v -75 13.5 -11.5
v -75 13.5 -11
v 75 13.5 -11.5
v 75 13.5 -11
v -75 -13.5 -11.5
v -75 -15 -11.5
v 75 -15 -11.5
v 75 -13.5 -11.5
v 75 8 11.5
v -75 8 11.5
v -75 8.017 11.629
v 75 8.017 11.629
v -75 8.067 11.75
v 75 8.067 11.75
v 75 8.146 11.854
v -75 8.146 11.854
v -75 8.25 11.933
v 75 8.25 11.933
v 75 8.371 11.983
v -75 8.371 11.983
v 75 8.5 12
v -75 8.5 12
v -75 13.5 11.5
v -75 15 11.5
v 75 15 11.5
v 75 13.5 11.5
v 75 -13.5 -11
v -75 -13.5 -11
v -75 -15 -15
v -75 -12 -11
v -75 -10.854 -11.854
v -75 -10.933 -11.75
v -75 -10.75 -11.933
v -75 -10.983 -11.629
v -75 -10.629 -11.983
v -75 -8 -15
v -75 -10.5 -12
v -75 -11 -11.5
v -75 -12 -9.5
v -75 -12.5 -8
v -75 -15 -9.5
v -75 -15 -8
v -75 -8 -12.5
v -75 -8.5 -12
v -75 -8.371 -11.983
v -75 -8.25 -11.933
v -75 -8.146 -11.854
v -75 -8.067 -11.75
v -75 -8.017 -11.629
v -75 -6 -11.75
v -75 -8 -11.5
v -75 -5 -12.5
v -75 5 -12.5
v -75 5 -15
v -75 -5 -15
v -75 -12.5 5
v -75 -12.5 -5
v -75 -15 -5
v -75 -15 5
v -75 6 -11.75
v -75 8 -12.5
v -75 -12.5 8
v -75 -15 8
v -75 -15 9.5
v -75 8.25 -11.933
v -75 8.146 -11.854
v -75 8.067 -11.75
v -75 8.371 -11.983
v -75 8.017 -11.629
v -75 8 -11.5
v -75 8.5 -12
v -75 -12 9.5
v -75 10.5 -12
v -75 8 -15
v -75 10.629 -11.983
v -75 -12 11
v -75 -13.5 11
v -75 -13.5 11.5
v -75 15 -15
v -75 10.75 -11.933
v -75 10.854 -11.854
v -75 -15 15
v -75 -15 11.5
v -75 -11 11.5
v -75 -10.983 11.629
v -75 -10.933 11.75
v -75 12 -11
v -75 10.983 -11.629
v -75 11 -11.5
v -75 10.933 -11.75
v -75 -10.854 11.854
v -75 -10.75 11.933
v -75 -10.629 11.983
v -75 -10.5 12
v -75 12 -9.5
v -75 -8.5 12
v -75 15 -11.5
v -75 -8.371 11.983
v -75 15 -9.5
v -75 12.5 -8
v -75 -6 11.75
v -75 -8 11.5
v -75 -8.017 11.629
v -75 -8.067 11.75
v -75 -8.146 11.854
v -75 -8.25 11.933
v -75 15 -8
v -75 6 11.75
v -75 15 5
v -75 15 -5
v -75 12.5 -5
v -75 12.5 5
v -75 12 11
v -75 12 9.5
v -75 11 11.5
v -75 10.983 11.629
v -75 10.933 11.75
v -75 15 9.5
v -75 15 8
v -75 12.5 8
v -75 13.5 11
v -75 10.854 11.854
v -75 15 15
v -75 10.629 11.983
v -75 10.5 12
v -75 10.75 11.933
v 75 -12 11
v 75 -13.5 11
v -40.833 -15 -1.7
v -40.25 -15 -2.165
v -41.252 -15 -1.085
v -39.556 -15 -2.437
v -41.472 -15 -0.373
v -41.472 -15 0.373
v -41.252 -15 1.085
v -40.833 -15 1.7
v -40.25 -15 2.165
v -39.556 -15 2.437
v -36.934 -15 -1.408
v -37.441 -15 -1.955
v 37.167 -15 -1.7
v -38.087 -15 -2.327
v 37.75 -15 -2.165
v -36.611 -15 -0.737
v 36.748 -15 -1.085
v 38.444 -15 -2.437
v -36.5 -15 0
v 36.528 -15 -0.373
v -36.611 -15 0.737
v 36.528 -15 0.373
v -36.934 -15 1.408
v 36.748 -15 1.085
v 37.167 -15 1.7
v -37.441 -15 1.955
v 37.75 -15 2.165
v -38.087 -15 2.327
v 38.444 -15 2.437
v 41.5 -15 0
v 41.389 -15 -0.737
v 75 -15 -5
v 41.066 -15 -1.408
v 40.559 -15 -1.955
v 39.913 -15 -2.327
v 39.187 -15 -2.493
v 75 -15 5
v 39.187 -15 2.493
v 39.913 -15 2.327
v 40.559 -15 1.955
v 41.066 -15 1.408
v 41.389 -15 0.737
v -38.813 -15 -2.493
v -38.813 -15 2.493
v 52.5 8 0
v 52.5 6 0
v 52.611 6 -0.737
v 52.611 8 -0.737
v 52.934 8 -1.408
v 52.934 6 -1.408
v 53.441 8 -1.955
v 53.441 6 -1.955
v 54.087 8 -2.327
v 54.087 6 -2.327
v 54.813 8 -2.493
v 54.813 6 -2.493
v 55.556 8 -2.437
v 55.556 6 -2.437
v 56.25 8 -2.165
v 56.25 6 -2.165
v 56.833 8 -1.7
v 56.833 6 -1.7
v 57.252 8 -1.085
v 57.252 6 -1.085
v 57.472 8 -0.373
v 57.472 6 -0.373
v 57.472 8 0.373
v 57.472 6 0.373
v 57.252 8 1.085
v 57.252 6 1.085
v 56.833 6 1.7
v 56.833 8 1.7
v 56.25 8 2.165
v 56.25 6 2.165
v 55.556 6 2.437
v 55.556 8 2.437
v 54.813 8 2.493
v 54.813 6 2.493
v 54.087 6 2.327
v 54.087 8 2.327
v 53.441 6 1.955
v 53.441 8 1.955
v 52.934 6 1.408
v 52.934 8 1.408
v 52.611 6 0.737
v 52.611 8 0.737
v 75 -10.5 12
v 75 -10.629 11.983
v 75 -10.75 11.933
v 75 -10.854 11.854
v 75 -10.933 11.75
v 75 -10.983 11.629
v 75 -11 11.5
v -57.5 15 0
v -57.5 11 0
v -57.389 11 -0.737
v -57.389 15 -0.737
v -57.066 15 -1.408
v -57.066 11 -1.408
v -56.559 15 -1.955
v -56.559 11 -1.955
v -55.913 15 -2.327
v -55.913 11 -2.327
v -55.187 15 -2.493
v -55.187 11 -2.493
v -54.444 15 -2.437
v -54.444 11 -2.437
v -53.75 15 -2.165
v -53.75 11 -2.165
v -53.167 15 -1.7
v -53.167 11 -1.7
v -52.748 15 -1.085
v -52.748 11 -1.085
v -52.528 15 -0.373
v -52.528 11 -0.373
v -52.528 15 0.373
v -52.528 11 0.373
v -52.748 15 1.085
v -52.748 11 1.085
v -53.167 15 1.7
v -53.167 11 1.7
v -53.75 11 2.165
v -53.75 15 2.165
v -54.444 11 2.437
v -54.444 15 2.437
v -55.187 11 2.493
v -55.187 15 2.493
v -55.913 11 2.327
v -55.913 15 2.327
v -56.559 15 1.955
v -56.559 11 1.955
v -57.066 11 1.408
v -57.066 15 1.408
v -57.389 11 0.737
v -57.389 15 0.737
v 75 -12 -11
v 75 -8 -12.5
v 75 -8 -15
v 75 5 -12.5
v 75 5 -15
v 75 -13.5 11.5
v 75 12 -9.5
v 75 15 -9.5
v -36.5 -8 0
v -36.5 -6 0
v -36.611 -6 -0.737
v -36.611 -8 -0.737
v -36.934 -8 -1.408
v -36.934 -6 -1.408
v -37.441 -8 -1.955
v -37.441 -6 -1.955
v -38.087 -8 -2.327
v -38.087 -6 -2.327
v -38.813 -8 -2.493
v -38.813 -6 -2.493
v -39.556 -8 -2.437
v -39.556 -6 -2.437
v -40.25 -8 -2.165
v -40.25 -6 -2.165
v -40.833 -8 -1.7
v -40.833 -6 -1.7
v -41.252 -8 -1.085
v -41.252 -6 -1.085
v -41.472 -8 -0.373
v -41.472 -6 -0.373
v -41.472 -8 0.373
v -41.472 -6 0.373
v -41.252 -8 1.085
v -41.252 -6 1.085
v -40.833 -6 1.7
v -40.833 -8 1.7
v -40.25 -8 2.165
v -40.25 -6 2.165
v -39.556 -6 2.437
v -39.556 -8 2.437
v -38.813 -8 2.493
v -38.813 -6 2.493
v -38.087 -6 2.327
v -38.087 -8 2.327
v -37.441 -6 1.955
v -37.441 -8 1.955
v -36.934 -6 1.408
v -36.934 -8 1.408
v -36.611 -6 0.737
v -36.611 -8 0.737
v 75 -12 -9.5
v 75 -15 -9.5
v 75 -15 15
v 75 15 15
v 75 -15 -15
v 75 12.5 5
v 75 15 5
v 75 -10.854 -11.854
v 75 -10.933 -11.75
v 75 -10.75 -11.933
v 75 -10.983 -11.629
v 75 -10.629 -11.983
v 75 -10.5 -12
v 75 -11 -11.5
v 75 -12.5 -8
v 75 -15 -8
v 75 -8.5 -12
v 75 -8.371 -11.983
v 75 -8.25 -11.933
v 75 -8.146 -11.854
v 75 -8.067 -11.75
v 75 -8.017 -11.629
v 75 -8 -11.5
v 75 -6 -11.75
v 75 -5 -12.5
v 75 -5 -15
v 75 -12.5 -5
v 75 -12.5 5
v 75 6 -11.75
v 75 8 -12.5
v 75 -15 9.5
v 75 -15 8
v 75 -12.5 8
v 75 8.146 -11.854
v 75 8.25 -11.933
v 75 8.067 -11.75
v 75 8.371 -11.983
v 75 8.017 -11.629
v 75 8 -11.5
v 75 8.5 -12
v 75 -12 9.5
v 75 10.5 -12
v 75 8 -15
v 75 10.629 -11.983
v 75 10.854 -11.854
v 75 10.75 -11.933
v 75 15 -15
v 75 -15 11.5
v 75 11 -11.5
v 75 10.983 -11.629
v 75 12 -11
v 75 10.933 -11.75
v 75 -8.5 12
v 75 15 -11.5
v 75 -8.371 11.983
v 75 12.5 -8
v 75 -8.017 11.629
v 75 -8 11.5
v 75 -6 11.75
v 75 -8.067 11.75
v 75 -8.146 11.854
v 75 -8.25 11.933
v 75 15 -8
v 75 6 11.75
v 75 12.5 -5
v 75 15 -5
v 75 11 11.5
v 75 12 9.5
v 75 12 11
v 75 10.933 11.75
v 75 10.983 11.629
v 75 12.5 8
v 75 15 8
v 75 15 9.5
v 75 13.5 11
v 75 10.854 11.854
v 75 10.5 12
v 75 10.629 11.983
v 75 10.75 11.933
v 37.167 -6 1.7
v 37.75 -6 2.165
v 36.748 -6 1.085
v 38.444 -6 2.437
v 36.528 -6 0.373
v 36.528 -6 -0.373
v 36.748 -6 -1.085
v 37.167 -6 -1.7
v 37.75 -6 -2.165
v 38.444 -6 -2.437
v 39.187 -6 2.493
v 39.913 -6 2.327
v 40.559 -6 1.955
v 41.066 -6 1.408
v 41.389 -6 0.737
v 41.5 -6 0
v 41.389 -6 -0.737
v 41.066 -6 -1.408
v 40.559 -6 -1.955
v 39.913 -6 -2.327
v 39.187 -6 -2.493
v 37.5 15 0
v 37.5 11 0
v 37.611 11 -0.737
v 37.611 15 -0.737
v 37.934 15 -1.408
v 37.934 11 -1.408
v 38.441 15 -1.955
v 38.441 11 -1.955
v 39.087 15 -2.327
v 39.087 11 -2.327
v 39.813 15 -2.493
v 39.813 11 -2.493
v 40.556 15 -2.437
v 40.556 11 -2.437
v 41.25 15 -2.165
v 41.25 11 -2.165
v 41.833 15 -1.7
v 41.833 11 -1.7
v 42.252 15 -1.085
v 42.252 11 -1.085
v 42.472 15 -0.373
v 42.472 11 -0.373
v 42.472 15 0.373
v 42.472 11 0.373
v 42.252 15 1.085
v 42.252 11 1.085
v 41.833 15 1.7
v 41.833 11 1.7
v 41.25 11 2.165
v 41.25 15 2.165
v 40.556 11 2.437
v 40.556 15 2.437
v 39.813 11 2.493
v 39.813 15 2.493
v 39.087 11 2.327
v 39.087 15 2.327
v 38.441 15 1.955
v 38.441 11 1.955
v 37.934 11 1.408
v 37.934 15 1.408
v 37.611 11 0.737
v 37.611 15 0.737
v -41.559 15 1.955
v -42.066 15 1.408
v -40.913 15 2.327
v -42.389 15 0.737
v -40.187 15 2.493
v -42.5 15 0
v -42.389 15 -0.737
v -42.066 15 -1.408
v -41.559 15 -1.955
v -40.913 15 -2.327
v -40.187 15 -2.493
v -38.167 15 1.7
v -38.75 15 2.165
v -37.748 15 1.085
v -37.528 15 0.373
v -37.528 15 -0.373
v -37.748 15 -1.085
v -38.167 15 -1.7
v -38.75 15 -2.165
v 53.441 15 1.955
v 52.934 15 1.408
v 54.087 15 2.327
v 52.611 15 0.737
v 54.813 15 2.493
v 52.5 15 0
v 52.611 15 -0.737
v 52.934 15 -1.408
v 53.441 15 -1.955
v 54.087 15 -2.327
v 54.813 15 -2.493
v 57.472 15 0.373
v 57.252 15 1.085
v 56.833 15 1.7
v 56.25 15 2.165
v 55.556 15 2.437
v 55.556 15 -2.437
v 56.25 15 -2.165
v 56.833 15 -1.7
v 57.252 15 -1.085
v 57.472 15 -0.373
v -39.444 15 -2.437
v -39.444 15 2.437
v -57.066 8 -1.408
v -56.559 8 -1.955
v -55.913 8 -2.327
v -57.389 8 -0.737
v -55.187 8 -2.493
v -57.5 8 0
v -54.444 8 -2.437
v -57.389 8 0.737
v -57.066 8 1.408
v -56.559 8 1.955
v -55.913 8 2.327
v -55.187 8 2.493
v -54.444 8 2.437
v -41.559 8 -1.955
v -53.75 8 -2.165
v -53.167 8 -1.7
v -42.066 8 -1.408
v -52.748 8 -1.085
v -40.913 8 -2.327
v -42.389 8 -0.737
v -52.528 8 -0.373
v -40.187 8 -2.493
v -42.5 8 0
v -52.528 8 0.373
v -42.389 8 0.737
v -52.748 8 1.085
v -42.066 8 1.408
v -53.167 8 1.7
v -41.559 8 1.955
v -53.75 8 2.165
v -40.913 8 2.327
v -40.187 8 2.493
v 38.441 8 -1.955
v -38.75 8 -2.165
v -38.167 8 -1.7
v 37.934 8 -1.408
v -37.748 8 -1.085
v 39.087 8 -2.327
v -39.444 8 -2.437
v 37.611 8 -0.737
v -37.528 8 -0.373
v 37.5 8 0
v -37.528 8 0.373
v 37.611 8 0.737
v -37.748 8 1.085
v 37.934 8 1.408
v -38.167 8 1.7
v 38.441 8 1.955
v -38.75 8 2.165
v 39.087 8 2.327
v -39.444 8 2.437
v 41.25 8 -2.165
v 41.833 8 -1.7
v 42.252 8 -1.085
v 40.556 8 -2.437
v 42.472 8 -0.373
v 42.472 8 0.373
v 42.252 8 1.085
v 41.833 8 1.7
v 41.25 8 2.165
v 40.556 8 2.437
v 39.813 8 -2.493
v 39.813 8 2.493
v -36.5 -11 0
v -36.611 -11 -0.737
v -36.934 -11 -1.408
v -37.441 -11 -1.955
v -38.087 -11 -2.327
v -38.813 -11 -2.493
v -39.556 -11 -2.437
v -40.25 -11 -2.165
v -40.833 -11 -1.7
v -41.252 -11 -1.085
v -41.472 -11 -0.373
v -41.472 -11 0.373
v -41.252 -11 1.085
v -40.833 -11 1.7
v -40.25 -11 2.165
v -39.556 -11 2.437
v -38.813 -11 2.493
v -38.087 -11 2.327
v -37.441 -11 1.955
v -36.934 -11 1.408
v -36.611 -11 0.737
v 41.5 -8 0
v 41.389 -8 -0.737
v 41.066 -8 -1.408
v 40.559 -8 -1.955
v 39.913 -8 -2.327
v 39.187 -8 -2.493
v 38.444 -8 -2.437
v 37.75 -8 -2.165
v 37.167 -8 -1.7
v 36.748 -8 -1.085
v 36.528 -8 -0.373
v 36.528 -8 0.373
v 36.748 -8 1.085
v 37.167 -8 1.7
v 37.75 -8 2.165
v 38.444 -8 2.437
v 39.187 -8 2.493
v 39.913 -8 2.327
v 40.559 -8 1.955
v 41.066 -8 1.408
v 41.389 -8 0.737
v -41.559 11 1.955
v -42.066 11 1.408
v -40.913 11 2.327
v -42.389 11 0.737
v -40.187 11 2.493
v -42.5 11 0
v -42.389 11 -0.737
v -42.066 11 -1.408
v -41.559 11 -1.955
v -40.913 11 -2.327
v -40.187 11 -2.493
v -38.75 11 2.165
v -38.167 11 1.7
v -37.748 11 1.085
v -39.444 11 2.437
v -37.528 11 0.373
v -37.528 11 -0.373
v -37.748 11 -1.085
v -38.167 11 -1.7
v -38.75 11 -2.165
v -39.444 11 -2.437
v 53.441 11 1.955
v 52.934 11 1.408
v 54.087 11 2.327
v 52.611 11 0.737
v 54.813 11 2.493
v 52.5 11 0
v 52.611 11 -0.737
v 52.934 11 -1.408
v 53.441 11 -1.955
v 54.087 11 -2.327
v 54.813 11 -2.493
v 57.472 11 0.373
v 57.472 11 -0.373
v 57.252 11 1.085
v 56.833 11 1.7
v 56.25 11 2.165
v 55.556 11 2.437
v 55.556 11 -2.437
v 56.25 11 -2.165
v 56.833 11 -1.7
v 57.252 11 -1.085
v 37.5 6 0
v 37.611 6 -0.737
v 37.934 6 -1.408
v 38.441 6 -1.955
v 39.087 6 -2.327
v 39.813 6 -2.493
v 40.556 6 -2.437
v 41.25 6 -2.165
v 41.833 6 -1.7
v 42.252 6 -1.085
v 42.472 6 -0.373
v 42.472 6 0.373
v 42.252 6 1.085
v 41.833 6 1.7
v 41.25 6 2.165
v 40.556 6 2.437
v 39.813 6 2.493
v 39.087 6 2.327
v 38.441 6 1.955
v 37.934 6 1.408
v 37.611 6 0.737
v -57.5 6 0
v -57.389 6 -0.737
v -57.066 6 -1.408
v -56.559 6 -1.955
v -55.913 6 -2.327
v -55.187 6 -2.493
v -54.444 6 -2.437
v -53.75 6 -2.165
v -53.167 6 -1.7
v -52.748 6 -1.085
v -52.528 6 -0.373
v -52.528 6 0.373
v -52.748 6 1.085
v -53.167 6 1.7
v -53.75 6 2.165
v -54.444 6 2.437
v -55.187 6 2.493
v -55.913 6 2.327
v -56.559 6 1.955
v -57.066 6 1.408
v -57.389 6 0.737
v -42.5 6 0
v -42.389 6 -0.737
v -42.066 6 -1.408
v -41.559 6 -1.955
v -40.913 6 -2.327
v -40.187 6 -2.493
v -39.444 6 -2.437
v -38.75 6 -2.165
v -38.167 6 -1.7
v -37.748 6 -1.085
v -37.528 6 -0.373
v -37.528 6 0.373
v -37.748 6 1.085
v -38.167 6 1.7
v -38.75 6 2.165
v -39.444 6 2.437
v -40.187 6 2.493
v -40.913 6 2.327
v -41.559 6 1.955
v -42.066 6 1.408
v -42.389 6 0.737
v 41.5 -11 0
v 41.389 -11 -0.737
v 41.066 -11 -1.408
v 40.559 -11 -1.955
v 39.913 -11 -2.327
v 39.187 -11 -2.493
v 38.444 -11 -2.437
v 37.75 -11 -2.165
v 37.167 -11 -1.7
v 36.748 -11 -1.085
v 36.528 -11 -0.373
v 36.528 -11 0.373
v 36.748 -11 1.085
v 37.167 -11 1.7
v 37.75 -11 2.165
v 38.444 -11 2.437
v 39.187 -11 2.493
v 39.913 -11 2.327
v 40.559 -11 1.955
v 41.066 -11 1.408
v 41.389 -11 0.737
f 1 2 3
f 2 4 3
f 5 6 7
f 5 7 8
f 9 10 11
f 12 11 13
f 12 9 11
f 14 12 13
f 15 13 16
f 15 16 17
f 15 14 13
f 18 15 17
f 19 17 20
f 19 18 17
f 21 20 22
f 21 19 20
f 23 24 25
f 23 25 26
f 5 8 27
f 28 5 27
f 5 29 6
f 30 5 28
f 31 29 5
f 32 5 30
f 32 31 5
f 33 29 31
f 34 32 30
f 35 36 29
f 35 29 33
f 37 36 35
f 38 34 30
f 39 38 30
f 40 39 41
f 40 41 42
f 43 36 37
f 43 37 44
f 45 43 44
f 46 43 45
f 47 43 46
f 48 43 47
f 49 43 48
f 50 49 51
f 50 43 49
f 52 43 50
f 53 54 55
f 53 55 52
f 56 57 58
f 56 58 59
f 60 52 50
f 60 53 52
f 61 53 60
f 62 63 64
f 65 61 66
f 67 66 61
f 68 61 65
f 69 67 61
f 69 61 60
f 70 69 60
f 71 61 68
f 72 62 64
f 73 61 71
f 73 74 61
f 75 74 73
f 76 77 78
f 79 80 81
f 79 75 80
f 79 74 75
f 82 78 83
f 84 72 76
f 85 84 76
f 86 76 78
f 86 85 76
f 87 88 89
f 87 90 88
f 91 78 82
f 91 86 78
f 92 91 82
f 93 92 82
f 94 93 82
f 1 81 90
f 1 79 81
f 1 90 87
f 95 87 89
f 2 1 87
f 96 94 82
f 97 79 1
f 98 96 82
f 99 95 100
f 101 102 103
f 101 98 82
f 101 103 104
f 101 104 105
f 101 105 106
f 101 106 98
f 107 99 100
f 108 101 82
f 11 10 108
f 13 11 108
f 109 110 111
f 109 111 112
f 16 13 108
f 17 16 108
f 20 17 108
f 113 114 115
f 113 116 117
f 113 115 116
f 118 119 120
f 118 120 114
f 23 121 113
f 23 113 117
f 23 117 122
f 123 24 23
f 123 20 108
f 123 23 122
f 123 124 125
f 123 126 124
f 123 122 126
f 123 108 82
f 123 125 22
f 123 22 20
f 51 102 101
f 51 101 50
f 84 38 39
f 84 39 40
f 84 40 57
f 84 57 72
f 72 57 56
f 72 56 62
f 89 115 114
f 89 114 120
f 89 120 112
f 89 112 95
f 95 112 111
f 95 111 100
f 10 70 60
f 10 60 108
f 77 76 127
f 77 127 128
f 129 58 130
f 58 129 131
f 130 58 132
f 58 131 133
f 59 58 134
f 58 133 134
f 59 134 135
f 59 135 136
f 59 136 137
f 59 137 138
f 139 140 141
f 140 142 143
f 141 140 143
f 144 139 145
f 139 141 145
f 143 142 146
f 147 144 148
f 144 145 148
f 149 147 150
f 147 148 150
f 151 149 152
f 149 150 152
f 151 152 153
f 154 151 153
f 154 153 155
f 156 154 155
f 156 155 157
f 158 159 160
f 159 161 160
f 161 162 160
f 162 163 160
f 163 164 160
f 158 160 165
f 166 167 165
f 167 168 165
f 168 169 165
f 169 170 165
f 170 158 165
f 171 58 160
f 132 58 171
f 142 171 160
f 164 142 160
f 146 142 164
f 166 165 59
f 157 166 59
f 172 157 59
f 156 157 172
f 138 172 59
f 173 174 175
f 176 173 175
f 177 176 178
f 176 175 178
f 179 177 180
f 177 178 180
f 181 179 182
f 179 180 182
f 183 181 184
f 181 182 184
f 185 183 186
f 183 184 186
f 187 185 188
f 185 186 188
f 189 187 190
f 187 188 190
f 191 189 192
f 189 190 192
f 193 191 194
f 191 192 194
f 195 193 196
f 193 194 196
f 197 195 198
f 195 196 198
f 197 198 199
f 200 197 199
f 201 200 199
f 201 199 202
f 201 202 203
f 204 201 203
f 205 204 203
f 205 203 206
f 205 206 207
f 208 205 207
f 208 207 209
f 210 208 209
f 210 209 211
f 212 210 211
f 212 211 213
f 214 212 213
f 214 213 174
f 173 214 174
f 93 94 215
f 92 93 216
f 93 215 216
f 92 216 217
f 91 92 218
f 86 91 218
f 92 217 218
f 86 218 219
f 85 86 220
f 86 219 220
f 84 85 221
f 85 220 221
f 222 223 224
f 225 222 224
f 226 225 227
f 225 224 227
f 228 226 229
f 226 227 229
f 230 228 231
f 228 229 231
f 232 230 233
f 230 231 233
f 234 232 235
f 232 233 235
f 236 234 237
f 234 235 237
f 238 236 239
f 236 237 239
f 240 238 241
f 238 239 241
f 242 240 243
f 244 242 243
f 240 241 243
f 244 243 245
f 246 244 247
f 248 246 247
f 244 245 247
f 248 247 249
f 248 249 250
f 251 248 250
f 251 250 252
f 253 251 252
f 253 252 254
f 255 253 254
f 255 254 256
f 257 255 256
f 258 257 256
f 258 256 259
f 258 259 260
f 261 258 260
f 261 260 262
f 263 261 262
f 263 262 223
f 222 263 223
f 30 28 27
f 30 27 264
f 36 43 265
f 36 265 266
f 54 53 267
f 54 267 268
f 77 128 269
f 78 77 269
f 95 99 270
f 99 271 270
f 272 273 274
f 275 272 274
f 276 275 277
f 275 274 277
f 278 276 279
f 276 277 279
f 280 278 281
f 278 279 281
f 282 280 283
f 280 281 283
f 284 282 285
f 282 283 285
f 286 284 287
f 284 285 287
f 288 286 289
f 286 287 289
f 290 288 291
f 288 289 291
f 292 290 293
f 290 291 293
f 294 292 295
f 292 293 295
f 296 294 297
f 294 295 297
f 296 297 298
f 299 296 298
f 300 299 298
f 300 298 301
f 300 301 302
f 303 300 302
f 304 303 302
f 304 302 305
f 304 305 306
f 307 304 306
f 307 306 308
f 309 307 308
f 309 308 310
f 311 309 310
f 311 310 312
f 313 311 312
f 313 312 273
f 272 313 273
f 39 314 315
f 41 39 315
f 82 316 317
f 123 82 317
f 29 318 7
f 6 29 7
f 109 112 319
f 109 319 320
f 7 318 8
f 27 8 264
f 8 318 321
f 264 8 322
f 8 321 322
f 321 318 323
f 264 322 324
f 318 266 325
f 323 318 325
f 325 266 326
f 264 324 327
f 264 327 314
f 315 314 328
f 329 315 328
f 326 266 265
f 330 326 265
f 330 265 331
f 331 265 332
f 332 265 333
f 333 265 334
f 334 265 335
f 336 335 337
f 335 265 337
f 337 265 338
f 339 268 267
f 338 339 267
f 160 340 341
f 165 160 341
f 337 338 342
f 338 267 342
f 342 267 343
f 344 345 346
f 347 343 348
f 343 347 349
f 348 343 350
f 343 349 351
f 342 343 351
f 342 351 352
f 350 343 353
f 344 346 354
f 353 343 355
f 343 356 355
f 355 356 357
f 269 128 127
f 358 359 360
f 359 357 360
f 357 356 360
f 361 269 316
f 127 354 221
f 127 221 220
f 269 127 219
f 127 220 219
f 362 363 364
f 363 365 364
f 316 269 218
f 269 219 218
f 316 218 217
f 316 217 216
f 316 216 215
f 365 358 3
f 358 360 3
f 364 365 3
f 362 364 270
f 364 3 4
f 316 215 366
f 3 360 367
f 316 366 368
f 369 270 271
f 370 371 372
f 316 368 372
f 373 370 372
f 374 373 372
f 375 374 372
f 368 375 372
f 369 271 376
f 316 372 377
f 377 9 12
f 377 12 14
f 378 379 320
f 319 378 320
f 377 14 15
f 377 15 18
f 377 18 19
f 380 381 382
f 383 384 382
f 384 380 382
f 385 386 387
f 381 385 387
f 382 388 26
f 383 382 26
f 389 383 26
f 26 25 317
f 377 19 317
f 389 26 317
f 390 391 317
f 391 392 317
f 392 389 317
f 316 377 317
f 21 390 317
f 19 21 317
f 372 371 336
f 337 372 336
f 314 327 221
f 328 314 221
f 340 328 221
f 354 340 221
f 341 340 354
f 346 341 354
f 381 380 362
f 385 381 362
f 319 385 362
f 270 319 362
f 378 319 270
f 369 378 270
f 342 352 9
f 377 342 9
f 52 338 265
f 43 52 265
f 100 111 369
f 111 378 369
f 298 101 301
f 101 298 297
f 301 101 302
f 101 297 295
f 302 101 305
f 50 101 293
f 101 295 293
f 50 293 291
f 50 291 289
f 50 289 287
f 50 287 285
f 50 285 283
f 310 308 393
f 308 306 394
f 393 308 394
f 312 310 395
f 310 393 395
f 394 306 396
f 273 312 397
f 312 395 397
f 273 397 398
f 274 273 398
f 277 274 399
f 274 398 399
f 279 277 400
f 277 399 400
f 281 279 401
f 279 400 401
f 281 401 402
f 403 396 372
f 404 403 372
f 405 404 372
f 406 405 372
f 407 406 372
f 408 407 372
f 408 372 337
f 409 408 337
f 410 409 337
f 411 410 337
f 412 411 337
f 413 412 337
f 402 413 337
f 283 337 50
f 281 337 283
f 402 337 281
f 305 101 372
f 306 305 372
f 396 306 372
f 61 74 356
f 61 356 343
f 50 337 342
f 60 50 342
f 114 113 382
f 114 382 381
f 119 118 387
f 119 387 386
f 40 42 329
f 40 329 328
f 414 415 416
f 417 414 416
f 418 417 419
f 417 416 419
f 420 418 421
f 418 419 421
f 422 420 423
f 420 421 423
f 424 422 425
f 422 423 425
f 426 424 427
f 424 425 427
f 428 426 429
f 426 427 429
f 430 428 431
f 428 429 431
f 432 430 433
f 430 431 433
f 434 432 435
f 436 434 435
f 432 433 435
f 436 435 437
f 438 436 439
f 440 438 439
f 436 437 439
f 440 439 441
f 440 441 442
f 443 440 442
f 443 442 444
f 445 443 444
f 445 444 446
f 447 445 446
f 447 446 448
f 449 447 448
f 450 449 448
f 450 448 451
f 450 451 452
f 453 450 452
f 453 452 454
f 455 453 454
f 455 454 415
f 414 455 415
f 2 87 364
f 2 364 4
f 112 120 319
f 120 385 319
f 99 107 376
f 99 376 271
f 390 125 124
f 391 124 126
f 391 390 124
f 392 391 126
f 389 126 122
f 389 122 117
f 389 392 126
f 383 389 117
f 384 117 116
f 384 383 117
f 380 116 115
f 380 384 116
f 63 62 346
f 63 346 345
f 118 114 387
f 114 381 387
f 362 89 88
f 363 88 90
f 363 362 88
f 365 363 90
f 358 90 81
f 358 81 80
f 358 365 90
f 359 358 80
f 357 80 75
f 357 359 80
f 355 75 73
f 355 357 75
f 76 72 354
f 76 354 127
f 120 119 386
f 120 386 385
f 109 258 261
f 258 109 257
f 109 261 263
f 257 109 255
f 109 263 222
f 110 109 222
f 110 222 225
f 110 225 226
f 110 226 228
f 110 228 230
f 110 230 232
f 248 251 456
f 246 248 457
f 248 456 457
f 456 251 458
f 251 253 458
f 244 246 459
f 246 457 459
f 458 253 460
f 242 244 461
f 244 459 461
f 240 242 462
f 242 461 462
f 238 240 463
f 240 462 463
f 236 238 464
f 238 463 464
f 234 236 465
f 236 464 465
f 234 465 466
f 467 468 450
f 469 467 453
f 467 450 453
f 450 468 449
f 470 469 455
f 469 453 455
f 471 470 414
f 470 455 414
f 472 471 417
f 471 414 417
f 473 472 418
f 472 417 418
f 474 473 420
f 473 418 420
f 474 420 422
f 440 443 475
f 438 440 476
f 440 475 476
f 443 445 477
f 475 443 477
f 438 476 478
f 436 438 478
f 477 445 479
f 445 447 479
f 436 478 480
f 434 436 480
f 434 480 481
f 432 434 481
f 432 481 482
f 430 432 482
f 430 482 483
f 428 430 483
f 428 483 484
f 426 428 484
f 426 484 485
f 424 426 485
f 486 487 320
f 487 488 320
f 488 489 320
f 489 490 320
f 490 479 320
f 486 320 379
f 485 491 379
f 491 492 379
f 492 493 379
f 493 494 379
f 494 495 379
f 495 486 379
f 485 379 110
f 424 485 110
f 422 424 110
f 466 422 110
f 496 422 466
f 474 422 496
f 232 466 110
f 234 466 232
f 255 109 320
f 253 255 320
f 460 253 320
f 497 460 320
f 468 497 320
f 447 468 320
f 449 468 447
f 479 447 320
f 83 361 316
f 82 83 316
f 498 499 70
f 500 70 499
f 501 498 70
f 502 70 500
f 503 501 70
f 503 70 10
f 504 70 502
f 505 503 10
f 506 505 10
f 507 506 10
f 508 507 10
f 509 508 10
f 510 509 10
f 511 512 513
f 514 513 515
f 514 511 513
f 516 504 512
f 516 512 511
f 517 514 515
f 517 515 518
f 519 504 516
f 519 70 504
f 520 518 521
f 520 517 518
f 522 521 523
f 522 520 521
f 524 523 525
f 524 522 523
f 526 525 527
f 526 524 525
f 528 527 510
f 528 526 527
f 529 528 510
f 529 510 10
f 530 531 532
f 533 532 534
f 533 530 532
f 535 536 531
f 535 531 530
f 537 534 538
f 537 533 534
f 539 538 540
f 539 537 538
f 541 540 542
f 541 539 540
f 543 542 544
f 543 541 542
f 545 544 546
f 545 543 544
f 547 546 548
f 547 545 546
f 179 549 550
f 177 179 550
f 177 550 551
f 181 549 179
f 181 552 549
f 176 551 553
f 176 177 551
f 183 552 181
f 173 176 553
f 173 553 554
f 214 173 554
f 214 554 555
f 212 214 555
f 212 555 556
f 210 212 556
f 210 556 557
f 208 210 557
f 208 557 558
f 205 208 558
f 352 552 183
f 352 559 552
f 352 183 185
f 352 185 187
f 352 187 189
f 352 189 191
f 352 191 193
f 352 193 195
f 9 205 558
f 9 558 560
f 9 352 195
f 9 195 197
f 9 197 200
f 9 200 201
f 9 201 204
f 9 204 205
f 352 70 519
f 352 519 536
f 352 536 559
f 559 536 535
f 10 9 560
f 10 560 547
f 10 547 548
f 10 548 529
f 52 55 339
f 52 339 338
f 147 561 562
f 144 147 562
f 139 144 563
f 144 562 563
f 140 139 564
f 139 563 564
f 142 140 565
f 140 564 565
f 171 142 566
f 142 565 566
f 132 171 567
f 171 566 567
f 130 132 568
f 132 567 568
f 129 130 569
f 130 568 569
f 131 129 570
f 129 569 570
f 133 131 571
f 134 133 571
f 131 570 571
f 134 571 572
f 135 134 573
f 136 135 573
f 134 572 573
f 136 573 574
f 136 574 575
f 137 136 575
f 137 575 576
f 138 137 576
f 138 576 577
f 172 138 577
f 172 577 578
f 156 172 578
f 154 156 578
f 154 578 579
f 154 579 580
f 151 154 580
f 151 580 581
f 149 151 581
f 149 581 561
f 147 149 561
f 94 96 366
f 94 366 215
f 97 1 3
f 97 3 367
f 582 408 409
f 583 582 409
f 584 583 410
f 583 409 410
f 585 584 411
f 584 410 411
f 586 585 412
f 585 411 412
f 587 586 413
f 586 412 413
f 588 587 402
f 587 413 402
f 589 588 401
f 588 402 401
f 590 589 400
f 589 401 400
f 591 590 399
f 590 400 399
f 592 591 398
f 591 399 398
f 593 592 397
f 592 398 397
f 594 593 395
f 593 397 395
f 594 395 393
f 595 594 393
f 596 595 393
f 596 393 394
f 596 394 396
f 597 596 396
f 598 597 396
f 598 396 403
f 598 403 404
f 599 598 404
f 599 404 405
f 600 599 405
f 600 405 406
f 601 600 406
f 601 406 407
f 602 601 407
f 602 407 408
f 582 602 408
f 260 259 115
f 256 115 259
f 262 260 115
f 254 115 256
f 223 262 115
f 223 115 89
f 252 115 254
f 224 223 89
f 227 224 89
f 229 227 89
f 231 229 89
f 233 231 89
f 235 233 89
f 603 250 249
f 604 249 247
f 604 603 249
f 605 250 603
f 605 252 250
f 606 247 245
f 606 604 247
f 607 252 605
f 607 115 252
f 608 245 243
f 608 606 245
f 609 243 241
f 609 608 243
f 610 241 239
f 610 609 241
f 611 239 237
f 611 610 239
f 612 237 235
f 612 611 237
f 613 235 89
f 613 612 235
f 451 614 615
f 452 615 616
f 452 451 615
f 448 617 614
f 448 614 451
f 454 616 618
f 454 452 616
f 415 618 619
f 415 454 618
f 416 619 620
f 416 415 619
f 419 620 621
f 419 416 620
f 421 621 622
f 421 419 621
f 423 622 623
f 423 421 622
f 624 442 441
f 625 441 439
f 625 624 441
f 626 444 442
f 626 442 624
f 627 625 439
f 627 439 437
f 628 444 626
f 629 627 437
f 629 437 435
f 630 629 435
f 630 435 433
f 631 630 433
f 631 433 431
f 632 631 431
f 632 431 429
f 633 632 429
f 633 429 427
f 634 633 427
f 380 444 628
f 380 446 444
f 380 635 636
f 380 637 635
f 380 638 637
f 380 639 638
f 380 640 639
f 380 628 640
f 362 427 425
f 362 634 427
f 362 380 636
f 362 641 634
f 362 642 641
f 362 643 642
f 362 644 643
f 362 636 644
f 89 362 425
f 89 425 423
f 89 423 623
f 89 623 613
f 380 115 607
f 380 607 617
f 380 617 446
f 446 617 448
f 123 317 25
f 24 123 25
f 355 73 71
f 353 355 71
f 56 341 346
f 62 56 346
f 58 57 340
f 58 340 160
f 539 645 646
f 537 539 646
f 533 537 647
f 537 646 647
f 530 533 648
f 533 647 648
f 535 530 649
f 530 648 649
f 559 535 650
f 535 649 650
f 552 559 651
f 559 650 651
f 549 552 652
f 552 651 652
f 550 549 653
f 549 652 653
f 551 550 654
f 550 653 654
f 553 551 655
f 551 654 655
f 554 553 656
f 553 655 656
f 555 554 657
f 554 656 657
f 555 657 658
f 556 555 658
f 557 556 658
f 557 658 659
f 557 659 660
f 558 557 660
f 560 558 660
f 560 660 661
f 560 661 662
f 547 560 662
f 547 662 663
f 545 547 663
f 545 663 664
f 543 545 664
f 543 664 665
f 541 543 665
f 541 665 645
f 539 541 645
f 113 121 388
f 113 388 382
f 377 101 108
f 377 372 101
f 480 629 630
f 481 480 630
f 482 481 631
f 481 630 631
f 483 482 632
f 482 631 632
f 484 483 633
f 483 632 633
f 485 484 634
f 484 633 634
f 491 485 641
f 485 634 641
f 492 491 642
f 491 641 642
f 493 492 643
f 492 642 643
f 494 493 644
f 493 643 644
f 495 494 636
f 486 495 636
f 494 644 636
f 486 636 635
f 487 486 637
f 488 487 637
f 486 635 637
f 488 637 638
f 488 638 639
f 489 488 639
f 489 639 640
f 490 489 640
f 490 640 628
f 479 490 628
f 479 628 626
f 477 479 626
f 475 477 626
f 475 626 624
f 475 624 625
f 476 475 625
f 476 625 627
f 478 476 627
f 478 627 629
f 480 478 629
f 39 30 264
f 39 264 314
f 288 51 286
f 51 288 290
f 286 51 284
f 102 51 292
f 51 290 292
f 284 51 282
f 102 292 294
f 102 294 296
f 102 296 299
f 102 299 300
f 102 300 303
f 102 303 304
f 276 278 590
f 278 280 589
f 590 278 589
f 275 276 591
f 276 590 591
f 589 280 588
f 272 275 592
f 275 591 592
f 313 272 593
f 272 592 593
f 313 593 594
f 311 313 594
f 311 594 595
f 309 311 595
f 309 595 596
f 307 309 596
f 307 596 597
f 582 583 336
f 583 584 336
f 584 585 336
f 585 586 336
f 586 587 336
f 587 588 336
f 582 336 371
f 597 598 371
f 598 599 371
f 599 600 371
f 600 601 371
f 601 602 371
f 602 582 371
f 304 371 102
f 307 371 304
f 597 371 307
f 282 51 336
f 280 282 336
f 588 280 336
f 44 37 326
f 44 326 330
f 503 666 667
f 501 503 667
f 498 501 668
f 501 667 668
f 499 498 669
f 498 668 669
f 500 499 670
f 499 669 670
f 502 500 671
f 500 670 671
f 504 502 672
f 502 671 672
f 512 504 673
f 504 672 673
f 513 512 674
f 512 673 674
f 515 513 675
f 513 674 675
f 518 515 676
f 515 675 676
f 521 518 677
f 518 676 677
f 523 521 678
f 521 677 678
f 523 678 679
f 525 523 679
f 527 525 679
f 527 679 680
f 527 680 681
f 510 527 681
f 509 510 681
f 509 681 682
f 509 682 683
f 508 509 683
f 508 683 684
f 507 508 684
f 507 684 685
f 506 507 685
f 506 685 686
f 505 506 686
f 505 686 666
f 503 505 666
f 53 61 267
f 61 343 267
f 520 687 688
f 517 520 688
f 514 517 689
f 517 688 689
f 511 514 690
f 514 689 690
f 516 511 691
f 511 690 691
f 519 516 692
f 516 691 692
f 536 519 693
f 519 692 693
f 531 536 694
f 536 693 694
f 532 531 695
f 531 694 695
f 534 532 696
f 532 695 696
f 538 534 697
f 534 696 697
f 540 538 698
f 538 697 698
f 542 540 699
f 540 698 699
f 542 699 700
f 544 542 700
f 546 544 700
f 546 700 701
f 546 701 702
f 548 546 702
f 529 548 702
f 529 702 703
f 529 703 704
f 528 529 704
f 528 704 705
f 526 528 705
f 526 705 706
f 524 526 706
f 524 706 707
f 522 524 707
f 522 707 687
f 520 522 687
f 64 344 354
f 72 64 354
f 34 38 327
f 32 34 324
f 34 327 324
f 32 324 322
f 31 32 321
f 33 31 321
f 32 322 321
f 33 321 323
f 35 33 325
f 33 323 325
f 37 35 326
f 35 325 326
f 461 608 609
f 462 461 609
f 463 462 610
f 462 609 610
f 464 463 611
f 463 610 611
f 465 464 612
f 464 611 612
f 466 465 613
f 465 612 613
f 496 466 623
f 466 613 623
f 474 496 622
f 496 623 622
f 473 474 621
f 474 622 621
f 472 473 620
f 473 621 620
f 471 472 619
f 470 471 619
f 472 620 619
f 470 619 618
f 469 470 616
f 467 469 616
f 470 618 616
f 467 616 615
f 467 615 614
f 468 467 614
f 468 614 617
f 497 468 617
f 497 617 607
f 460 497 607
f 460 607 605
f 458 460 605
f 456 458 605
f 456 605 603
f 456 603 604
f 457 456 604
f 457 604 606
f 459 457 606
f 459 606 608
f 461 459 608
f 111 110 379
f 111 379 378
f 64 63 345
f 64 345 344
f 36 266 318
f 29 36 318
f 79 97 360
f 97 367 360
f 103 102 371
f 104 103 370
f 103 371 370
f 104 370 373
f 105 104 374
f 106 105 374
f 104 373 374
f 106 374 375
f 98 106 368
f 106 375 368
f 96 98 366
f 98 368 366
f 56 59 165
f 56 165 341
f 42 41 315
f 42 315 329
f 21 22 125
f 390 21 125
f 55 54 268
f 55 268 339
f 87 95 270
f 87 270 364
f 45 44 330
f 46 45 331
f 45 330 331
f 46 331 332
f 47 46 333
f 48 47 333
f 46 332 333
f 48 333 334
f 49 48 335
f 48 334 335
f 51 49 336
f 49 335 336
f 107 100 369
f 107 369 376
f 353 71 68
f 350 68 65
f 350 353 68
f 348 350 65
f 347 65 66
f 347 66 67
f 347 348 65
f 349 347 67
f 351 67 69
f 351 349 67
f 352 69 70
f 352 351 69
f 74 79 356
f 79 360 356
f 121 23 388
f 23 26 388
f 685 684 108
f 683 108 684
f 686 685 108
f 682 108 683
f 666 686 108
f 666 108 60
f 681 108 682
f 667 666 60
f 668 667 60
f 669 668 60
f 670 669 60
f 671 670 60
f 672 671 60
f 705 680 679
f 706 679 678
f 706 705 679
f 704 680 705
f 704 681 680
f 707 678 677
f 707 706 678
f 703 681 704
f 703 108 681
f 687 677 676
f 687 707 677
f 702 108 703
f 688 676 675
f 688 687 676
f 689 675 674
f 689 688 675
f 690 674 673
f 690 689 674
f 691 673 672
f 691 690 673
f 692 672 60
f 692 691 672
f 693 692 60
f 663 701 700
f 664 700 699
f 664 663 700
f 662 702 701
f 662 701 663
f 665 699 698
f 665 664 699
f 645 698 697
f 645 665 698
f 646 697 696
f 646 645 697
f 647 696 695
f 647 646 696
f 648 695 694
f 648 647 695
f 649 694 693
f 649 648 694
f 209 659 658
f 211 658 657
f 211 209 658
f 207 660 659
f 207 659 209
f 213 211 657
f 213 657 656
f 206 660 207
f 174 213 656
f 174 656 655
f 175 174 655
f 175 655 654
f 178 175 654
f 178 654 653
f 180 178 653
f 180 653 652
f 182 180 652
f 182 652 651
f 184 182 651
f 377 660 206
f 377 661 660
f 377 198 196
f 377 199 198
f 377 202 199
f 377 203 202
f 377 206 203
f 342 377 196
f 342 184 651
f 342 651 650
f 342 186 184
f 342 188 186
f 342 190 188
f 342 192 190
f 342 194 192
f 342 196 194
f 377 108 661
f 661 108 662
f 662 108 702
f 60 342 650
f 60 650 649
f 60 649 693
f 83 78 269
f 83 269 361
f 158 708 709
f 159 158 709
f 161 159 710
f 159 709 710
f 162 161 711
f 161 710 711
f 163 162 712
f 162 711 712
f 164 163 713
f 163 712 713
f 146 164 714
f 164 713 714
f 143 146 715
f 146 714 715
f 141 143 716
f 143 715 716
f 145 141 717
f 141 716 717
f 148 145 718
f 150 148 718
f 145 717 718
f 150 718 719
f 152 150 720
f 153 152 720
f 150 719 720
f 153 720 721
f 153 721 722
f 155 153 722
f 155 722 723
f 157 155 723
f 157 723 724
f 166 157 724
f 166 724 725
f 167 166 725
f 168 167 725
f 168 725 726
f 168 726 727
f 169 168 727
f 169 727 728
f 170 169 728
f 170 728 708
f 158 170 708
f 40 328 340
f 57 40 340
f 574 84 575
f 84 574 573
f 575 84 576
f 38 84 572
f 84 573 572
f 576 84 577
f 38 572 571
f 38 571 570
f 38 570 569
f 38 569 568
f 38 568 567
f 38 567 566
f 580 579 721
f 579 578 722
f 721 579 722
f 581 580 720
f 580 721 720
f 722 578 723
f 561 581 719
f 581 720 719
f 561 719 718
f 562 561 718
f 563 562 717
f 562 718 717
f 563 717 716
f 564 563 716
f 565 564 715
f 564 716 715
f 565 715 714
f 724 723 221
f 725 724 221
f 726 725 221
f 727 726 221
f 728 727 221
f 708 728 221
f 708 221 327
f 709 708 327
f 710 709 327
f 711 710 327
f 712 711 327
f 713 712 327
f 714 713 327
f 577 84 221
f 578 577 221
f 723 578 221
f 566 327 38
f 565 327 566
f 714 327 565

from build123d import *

# Parameters (mm, degrees)
SKETCH_1_W             = 23.5
SKETCH_1_H             = 12
EXTRUDE_1_DEPTH        = 75
HOLE_WIZARD_M6_1_D     = 5
HOLE_WIZARD_M6_1_DEPTH = 19
HOLE_WIZARD_M6_1_TIP   = 1.502151548
HOLE_WIZARD_M6_2_D     = 5
HOLE_WIZARD_M6_2_DEPTH = 19
HOLE_WIZARD_M6_2_TIP   = 1.502151548


with BuildPart() as part:
    # 草图1 → 凸台-拉伸1 (new, symmetric)
    with BuildSketch(Plane(origin=(0, 0, 0), x_dir=(0, 0, -1), z_dir=(1, 0, 0))):
        Polygon((-15, 15), (-11.5, 15), (-11.5, 13.5), (-11, 13.5), (-11, 12), (-9.5, 12), (-9.5, 15), (-8, 15), (-8, 12.5), (-5, 12.5), (-5, 15), (5, 15), (5, 12.5), (8, 12.5), (8, 15), (9.5, 15), (9.5, 12), (11, 12), (11, 13.5), (11.5, 13.5), (11.5, 15), (15, 15), (15, 8), (12.5, 8), (12.5, 5), (15, 5), (15, -5), (12.5, -5), (12.5, -8), (15, -8), (15, -15), (11.5, -15), (11.5, -13.5), (11, -13.5), (11, -12), (9.5, -12), (9.5, -15), (8, -15), (8, -12.5), (5, -12.5), (5, -15), (-5, -15), (-5, -12.5), (-8, -12.5), (-8, -15), (-9.5, -15), (-9.5, -12), (-11, -12), (-11, -13.5), (-11.5, -13.5), (-11.5, -15), (-15, -15), align=None)
        with BuildLine():
            Line((12, -10.5), (12, -8.5))
            ThreePointArc((12, -8.5), (11.853553391, -8.146446609), (11.5, -8))
            Line((11.5, -8), (-11.5, -8))
            ThreePointArc((-11.5, -8), (-11.853553391, -8.146446609), (-12, -8.5))
            Line((-12, -8.5), (-12, -10.5))
            ThreePointArc((-12, -10.5), (-11.853553391, -10.853553391), (-11.5, -11))
            Line((-11.5, -11), (11.5, -11))
            ThreePointArc((11.5, -11), (11.853553391, -10.853553391), (12, -10.5))
        make_face(mode=Mode.SUBTRACT)
        with BuildLine():
            Line((-11.5, 11), (11.5, 11))
            ThreePointArc((11.5, 11), (11.853553391, 10.853553391), (12, 10.5))
            Line((12, 10.5), (12, 8.5))
            ThreePointArc((12, 8.5), (11.853553391, 8.146446609), (11.5, 8))
            Line((11.5, 8), (-11.5, 8))
            ThreePointArc((-11.5, 8), (-11.853553391, 8.146446609), (-12, 8.5))
            Line((-12, 8.5), (-12, 10.5))
            ThreePointArc((-12, 10.5), (-11.853553391, 10.853553391), (-11.5, 11))
        make_face(mode=Mode.SUBTRACT)
        Rectangle(SKETCH_1_W, SKETCH_1_H, mode=Mode.SUBTRACT)
    extrude(amount=EXTRUDE_1_DEPTH, both=True)

    # M6 螺纹孔1
    with Locations(Plane(origin=(0, 15, 0), x_dir=(1, 0, 0), z_dir=(0, 1, 0))):
        with Locations((-40, 0), (-55, 0), (55, 0), (40, 0)):
            Hole(HOLE_WIZARD_M6_1_D / 2, depth=HOLE_WIZARD_M6_1_DEPTH)
            with Locations((0, 0, -(HOLE_WIZARD_M6_1_DEPTH + HOLE_WIZARD_M6_1_TIP / 2))):  # 118° drill point
                Cone(0, HOLE_WIZARD_M6_1_D / 2, HOLE_WIZARD_M6_1_TIP, mode=Mode.SUBTRACT)

    # M6 螺纹孔2
    with Locations(Plane(origin=(0, -15, 0), x_dir=(-1, 0, 0), z_dir=(0, -1, 0))):
        with Locations((-39, 0), (39, 0)):
            Hole(HOLE_WIZARD_M6_2_D / 2, depth=HOLE_WIZARD_M6_2_DEPTH)
            with Locations((0, 0, -(HOLE_WIZARD_M6_2_DEPTH + HOLE_WIZARD_M6_2_TIP / 2))):  # 118° drill point
                Cone(0, HOLE_WIZARD_M6_2_D / 2, HOLE_WIZARD_M6_2_TIP, mode=Mode.SUBTRACT)


solid = part.part
